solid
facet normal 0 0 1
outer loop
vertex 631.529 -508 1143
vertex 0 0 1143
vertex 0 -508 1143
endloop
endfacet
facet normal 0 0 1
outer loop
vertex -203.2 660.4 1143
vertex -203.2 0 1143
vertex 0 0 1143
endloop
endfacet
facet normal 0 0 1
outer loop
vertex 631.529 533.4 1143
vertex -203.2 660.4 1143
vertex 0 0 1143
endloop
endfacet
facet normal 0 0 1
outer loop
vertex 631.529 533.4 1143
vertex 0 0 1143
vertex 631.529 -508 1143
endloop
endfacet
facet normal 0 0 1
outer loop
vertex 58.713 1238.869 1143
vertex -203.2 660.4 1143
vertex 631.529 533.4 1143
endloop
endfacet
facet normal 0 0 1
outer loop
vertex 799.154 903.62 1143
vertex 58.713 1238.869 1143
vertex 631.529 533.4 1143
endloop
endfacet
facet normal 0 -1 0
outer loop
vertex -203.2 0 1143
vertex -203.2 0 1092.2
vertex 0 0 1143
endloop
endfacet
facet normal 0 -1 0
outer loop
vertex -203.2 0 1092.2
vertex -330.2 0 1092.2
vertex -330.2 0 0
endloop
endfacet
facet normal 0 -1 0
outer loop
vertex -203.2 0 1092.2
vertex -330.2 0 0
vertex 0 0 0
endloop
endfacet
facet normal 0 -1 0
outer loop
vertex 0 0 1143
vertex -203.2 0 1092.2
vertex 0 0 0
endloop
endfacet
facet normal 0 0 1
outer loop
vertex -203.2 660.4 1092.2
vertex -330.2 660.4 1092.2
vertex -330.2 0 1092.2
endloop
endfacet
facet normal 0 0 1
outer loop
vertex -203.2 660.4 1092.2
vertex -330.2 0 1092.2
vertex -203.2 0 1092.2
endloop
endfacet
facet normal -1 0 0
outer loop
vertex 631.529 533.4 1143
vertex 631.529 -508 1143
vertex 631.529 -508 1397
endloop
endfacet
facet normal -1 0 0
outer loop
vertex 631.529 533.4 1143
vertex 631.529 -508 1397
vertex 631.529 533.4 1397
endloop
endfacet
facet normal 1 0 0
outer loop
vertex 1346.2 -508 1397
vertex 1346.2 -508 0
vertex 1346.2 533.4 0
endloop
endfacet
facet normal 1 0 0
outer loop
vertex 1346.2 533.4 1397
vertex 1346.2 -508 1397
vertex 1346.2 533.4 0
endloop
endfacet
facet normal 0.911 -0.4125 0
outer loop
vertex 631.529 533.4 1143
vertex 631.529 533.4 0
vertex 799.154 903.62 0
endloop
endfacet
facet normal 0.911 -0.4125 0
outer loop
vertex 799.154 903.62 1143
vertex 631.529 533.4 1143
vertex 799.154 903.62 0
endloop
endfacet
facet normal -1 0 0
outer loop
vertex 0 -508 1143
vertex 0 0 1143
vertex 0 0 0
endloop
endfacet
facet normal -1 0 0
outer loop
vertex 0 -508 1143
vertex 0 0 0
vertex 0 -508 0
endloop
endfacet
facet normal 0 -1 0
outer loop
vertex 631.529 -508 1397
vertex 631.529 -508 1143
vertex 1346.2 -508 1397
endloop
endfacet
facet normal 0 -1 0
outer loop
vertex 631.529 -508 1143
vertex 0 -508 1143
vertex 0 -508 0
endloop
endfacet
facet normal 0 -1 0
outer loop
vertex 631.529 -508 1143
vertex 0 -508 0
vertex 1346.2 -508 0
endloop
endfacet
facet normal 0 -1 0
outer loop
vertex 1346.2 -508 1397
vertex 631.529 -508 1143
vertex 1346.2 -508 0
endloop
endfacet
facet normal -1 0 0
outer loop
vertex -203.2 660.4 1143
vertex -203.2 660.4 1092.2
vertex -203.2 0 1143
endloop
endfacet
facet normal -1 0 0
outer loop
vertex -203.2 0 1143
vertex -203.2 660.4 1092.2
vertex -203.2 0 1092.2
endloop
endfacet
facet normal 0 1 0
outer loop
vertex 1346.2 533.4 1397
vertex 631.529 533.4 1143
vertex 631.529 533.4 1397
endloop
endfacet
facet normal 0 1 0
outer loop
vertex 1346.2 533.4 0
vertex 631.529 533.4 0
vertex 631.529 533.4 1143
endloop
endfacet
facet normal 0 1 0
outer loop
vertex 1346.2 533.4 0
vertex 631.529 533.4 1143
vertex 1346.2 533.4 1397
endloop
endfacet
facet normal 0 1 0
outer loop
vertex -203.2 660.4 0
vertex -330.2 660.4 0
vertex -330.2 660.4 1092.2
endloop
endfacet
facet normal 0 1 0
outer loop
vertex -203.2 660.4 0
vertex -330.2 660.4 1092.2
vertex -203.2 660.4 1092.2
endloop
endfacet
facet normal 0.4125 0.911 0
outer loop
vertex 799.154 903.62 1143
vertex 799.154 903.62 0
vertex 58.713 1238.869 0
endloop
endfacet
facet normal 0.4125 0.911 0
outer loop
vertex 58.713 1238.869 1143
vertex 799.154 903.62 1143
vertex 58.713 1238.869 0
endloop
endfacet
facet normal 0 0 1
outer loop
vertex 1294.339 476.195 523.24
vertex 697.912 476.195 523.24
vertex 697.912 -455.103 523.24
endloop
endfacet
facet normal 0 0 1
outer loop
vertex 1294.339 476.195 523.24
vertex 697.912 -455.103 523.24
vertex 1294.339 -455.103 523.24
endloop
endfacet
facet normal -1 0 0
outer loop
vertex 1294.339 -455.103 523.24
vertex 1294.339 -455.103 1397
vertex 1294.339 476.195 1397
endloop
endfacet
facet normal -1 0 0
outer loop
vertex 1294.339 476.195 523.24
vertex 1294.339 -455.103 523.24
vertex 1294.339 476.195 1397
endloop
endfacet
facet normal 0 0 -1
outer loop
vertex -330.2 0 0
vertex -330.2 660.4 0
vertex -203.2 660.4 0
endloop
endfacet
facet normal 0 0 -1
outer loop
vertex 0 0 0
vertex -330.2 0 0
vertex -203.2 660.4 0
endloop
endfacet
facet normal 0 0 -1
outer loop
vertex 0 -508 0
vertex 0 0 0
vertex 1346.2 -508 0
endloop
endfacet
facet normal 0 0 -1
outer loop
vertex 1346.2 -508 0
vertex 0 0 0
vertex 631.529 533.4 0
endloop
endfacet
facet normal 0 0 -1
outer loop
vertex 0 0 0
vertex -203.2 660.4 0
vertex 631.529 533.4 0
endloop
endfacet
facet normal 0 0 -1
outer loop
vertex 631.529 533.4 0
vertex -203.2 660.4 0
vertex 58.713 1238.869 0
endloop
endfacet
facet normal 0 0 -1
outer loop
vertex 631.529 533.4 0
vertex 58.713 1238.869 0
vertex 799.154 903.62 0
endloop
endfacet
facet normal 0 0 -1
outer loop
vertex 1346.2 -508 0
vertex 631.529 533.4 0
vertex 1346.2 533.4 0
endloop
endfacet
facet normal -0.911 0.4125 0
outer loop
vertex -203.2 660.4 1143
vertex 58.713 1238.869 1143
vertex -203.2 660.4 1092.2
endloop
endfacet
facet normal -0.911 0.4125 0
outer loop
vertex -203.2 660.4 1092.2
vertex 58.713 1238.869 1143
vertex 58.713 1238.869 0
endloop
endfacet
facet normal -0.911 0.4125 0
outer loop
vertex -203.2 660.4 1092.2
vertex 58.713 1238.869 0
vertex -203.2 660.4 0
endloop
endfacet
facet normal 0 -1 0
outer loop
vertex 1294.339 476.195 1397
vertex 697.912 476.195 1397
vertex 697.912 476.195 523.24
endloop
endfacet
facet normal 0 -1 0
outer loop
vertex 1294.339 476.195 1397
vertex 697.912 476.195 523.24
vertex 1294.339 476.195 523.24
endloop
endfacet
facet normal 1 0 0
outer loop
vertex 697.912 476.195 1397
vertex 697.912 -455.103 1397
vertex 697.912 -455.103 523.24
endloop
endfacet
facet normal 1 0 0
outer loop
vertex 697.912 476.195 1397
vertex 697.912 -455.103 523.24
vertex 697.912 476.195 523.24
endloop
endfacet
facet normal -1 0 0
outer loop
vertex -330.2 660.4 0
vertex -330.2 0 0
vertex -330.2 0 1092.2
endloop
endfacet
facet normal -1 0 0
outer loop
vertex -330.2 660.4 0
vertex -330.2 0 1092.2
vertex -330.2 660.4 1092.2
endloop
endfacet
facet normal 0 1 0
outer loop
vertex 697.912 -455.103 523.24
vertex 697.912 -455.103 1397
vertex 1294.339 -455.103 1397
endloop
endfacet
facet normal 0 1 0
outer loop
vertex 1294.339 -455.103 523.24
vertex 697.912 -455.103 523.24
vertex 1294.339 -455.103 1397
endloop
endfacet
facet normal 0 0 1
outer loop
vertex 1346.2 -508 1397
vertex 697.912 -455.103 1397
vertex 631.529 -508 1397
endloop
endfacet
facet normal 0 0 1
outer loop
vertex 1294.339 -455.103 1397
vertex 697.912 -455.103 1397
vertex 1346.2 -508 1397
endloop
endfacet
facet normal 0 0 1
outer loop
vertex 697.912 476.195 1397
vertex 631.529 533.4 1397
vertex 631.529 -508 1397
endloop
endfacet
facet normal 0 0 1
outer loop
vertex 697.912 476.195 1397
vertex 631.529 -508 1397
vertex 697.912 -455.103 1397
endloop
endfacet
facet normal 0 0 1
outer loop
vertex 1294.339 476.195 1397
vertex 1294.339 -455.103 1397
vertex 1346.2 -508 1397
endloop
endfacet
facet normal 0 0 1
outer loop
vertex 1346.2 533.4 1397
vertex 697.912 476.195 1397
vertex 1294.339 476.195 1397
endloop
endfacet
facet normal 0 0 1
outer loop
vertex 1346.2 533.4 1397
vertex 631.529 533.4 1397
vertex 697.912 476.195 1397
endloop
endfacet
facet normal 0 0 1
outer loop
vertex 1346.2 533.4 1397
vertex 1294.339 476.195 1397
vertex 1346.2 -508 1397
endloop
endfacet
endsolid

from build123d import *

# Parameters (mm, degrees)
F0_W     = 714.670822
F0_H     = 1041.4
F1_DEPTH = 1397
F2_DEPTH = 1143
F0_W_2   = 127
F0_H_2   = 660.4
F3_DEPTH = 1092.2
F4_W     = 596.427142
F4_H     = 931.297839
F5_DEPTH = 873.76


with BuildPart() as f1:
    # F0 (on Top) → F1 (new body)
    with BuildSketch(Plane.XY):
        with Locations((988.864589, 12.7)):
            Rectangle(F0_W, F0_H)
    extrude(amount=F1_DEPTH)

    # F0 (on Top) → F2 (join)
    with BuildSketch(Plane.XY):
        Polygon((-203.2, 0), (0, 0), (0, -508), (631.529178, -508), (631.529178, 533.4), (799.153613, 903.620216), (58.713181, 1238.869088), (-203.2, 660.4), align=None)
    extrude(amount=F2_DEPTH)

    # F0 (on Top) → F3 (join)
    with BuildSketch(Plane.XY):
        with Locations((-266.7, 330.2)):
            Rectangle(F0_W_2, F0_H_2)
    extrude(amount=F3_DEPTH)

    # F4 (on face) → F5 (cut)
    with BuildSketch(Plane.XY.offset(1397)):
        with Locations((996.125251, 10.54573)):
            Rectangle(F4_W, F4_H)
    extrude(amount=-F5_DEPTH, mode=Mode.SUBTRACT)


solid = f1.part
